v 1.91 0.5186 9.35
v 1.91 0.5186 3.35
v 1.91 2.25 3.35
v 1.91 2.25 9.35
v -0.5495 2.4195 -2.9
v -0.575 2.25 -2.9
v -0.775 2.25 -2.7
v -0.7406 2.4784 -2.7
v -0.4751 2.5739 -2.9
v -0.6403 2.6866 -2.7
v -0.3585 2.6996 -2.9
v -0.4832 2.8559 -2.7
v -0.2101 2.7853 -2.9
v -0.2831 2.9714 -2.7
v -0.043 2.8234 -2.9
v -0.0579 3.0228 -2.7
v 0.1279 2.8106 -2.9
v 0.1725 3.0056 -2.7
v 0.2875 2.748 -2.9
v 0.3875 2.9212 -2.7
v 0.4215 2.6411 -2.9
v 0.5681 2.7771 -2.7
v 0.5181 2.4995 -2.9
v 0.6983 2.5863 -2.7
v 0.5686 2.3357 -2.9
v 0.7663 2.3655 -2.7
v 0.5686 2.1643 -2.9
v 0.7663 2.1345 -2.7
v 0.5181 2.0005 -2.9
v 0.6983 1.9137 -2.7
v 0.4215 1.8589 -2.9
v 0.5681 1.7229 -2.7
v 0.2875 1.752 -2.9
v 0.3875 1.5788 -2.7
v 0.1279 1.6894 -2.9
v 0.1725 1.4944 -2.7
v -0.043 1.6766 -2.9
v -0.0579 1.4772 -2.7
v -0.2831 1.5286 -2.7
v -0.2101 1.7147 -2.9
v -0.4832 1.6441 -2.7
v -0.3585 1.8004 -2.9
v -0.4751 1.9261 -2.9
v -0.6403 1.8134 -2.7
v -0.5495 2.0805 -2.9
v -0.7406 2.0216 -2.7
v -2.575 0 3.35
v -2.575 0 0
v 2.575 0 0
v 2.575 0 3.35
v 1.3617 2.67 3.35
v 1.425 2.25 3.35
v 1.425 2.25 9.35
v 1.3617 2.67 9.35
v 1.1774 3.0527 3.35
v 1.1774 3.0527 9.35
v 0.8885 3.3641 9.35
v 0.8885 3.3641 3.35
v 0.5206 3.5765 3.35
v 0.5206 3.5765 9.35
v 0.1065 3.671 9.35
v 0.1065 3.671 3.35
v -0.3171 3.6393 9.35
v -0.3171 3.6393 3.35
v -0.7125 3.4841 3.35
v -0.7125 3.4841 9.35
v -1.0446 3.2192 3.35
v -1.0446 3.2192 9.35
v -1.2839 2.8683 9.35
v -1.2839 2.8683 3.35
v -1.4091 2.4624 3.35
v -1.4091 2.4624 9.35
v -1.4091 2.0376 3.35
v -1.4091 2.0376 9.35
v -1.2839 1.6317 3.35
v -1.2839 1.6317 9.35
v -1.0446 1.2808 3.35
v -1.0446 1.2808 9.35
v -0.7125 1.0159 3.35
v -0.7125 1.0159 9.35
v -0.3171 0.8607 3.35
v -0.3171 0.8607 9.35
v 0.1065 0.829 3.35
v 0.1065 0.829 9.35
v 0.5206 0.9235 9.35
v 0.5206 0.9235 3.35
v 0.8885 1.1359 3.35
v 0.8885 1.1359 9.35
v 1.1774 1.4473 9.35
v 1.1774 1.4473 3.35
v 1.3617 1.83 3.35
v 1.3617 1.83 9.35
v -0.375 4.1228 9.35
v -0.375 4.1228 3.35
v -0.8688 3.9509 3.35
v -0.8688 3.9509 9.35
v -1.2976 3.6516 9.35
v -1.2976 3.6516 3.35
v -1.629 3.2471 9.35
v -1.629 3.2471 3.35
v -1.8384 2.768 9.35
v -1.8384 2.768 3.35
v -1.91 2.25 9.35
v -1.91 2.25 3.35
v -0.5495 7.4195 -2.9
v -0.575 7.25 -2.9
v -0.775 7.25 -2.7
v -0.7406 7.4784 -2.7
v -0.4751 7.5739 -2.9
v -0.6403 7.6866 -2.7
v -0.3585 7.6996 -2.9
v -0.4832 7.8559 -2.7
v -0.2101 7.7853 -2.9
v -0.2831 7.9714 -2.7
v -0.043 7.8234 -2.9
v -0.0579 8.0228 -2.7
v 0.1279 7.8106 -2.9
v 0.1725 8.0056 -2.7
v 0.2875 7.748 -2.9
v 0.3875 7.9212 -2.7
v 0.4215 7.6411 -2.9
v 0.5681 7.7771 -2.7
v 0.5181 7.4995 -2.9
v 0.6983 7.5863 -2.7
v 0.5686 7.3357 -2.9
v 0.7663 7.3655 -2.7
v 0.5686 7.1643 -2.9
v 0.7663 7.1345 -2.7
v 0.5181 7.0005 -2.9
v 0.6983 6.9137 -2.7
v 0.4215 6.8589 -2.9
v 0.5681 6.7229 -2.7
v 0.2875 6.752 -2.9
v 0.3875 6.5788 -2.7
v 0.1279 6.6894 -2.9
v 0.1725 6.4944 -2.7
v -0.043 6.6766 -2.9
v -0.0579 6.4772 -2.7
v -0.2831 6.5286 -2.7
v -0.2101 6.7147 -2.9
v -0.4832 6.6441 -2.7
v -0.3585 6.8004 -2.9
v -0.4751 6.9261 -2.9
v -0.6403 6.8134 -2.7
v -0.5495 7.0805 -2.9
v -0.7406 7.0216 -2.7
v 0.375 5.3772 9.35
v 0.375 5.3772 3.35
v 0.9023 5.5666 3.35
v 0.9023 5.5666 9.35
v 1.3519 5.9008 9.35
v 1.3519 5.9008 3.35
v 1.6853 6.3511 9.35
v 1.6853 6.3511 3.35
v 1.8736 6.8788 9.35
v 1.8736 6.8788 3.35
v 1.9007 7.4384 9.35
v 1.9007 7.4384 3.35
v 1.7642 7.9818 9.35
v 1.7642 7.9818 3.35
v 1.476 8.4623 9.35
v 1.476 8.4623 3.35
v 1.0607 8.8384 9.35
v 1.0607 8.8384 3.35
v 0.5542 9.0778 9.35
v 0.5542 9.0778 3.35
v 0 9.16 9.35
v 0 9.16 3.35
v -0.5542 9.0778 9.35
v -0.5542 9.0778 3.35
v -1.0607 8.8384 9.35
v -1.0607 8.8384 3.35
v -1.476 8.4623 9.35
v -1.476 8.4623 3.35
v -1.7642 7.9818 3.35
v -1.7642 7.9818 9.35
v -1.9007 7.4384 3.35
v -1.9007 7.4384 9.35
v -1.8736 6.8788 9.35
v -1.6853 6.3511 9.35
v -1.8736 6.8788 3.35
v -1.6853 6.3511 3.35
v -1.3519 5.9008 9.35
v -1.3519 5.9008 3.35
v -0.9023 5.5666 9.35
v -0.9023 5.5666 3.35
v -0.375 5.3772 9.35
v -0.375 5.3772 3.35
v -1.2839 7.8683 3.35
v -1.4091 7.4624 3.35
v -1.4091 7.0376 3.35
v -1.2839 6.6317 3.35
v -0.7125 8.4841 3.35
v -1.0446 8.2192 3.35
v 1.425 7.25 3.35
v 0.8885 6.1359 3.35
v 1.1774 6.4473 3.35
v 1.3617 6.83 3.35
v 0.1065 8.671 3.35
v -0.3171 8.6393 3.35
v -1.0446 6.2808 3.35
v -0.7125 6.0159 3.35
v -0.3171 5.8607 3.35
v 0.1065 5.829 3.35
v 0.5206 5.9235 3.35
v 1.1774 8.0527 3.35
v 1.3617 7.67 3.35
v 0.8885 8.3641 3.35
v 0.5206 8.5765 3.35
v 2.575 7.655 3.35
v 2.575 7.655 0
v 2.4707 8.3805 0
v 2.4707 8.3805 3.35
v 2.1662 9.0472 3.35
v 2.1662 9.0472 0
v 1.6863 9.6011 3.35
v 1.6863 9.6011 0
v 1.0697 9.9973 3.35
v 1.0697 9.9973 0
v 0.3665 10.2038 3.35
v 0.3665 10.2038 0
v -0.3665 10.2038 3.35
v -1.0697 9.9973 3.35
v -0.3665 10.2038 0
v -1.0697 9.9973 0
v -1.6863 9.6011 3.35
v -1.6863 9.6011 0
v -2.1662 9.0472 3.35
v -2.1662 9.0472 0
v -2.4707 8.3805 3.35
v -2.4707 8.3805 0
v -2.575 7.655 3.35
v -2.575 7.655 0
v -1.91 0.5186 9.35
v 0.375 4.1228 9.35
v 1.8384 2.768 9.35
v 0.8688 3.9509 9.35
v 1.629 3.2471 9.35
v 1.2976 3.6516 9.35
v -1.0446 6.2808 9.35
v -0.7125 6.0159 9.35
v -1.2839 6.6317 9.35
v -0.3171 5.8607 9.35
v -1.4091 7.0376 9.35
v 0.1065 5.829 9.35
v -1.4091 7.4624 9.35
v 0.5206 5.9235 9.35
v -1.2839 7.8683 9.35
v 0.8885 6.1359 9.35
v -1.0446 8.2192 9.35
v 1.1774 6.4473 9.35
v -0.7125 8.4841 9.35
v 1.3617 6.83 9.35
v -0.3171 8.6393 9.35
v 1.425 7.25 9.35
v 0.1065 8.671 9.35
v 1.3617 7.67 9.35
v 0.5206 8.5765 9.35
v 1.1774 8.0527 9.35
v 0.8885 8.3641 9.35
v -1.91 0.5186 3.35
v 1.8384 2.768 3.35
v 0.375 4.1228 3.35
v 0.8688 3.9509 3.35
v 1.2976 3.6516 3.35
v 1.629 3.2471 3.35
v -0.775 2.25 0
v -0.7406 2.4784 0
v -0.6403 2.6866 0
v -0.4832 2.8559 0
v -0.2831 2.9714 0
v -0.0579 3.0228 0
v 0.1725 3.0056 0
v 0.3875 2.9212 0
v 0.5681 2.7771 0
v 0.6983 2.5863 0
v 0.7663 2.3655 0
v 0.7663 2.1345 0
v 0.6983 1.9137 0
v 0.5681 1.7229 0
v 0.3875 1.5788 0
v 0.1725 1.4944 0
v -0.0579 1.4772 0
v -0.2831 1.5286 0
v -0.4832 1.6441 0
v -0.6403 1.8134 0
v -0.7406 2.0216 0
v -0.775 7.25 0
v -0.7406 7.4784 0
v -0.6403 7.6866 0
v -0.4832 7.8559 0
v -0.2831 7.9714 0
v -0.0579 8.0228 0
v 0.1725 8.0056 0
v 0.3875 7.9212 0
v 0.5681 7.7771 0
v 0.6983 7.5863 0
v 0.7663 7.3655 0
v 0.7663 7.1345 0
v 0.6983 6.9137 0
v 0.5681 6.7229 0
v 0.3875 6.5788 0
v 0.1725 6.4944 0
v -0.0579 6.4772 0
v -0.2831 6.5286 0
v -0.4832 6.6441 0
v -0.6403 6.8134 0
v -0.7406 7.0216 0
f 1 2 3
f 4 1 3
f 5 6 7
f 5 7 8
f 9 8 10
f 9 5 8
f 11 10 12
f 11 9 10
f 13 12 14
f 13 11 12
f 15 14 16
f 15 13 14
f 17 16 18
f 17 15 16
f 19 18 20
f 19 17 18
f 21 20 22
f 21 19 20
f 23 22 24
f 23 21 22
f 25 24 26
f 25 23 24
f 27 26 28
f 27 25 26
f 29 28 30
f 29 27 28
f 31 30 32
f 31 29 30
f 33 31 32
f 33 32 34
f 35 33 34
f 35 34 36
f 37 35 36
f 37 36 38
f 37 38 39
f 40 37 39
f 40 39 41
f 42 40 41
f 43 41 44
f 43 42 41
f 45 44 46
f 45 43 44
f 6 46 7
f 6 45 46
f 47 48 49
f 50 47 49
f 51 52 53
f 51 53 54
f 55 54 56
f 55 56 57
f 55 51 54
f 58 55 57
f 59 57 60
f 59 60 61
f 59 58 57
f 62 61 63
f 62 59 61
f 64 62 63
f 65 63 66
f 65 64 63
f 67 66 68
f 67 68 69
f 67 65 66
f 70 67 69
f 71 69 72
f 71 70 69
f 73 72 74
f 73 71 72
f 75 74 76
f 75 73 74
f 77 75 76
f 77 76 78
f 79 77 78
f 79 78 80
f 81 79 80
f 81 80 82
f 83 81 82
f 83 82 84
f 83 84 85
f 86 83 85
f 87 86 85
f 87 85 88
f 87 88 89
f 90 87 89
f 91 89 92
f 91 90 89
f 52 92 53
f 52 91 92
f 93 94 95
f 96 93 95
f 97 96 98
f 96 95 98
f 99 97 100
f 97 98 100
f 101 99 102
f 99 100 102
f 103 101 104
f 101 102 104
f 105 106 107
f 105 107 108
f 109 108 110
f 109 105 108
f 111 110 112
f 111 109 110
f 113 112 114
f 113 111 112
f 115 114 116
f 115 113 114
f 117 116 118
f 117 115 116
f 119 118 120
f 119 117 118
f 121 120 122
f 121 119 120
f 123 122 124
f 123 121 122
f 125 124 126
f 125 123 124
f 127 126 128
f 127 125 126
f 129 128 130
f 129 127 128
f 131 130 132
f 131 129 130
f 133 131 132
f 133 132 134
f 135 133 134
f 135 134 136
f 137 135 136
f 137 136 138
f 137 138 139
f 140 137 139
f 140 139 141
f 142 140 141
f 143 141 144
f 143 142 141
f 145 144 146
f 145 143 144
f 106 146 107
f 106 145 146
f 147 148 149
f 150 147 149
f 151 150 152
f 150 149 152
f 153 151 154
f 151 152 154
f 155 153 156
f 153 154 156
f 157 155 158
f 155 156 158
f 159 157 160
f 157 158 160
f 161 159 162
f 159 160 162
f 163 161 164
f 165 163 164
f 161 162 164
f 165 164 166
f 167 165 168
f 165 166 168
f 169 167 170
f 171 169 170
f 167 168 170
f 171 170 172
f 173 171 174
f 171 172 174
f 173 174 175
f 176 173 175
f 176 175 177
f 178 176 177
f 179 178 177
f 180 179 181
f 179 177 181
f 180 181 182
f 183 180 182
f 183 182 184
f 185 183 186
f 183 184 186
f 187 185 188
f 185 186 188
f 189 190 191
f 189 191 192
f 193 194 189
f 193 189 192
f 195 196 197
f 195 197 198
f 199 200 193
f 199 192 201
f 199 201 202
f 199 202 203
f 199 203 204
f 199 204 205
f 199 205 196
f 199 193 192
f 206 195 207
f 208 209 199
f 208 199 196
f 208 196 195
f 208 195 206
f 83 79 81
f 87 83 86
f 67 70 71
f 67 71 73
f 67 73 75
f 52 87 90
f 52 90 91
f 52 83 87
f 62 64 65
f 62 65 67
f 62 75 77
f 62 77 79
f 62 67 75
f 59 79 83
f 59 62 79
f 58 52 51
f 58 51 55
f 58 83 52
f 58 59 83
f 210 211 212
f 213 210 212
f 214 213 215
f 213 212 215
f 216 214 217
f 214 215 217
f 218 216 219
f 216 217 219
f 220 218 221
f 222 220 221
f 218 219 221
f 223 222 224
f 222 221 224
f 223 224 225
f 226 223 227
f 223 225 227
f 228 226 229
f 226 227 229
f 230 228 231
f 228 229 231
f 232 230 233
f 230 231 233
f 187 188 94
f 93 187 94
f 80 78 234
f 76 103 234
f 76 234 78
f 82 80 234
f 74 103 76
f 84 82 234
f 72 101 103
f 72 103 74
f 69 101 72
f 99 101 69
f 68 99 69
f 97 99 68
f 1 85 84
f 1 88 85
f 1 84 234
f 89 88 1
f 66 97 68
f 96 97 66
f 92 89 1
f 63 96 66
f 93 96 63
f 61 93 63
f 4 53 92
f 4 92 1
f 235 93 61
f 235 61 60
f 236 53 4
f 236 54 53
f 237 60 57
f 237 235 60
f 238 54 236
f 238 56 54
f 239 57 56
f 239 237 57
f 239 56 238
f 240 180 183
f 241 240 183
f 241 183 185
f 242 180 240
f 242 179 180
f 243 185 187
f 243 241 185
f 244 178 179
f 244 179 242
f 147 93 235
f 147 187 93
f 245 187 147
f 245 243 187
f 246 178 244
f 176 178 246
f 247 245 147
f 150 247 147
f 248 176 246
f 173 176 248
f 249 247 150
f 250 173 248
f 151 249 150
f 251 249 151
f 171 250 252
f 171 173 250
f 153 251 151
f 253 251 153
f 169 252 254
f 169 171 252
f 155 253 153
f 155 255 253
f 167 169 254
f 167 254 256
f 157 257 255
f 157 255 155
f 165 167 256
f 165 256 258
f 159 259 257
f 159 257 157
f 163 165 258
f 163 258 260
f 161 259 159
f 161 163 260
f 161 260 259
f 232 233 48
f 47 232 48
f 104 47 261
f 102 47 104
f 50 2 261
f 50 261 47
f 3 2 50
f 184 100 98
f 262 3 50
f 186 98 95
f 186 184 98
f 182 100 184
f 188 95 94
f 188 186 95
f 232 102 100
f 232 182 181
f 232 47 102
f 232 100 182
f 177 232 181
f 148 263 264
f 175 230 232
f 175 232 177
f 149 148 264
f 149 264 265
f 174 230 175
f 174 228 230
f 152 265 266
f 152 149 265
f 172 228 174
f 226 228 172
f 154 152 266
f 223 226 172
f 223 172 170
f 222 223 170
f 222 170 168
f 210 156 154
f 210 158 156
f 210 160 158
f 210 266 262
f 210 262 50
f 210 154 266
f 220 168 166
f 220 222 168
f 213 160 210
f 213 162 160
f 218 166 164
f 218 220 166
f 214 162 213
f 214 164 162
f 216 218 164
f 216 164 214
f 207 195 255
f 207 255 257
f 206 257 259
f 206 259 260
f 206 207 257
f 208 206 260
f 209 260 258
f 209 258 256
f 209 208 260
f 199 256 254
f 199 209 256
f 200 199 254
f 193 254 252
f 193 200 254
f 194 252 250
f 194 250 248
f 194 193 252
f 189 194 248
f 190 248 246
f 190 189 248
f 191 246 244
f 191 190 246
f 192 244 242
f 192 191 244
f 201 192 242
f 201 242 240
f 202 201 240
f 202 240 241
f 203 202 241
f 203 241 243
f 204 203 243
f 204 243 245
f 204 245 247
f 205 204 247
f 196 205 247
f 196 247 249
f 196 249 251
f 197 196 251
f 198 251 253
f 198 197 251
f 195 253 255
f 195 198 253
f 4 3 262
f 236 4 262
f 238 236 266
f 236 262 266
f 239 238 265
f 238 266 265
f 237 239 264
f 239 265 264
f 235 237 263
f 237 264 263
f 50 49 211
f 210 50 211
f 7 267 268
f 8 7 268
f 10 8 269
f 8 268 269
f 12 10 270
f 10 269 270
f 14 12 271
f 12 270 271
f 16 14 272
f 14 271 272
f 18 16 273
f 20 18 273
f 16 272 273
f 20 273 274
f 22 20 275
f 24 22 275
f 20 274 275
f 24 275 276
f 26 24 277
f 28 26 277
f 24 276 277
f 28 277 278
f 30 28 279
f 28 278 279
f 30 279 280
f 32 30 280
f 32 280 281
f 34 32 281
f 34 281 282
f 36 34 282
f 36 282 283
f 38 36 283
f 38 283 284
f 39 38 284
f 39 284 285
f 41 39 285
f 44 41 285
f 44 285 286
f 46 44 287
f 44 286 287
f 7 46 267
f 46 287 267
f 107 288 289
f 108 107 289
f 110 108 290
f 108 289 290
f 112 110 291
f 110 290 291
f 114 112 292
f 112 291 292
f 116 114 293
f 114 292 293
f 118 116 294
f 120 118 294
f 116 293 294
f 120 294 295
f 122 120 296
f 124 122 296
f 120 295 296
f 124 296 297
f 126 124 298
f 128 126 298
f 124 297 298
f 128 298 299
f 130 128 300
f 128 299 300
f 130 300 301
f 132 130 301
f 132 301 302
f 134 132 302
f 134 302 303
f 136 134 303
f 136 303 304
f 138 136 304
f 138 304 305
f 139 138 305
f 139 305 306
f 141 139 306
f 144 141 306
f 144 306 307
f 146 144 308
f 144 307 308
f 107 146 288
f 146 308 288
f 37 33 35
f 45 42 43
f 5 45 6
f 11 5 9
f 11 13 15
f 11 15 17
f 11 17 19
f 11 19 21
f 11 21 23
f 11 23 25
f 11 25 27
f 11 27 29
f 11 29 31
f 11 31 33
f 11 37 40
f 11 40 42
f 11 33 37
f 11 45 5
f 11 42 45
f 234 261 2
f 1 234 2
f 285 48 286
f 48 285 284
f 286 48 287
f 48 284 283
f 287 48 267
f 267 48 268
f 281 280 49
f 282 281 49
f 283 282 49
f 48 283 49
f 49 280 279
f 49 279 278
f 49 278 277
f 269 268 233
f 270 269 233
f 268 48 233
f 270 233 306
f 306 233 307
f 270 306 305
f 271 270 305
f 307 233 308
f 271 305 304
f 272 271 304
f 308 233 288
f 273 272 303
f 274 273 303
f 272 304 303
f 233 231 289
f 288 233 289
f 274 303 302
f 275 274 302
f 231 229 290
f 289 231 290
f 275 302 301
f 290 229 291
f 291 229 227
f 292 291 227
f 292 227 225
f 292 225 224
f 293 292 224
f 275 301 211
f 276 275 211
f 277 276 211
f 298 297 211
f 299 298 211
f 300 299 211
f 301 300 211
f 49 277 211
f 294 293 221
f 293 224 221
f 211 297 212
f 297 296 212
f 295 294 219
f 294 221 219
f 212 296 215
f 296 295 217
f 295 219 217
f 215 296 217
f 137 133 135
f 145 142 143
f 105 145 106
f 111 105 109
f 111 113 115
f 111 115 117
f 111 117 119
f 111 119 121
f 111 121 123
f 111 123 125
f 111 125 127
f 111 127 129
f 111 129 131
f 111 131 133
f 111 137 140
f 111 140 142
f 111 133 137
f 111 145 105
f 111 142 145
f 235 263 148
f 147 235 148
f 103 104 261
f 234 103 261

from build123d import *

# Parameters (mm, degrees)
SALIENTE_EXTRUIR1_DEPTH = 3.35
CROQUIS2_R              = 0.775
SALIENTE_EXTRUIR2_DEPTH = 2.9
CHAFL_N1_SIZE           = 0.2
CROQUIS3_R              = 1.425
SALIENTE_EXTRUIR3_DEPTH = 6


with BuildPart() as part:
    # Croquis1 → Saliente-Extruir1 (new body)
    with BuildSketch(Plane.XY):
        with BuildLine():
            Line((-2.575, 7.655), (-2.575, 0))
            Line((-2.575, 0), (2.575, 0))
            Line((2.575, 0), (2.575, 7.655))
            ThreePointArc((2.575, 7.655), (0, 10.23), (-2.575, 7.655))
        make_face()
    extrude(amount=SALIENTE_EXTRUIR1_DEPTH)

    # Croquis2 → Saliente-Extruir2 (add)
    with BuildSketch(Plane(origin=(0, 0, 0), x_dir=(-1, 0, 0), z_dir=(0, 0, -1))):
        with Locations((0, 7.25)):
            Circle(CROQUIS2_R)
        with Locations((0, 2.25)):
            Circle(CROQUIS2_R)
    extrude(amount=SALIENTE_EXTRUIR2_DEPTH)

    # Chaflán1
    chafl_n1_edges = [part.edges().sort_by_distance(p)[0] for p in [
        (0.775, 7.25, -2.9),
        (0.775, 2.25, -2.9),
    ]]
    chamfer(chafl_n1_edges, length=CHAFL_N1_SIZE)

    # Croquis3 → Saliente-Extruir3 (add)
    with BuildSketch(Plane.XY.offset(3.35)):
        with BuildLine():
            Line((-1.91, 2.25), (-1.91, 0.51859855))
            Line((-1.91, 0.51859855), (1.91, 0.51859855))
            Line((1.91, 0.51859855), (1.91, 2.25))
            ThreePointArc((1.91, 2.25), (1.47721867, 3.460753897), (0.375, 4.122825406))
            Line((0.375, 4.122825406), (0.375, 5.377174594))
            ThreePointArc((0.375, 5.377174594), (0, 9.16), (-0.375, 5.377174594))
            Line((-0.375, 5.377174594), (-0.375, 4.122825406))
            ThreePointArc((-0.375, 4.122825406), (-1.47721867, 3.460753897), (-1.91, 2.25))
        make_face()
        with Locations((0, 2.25)):
            Circle(CROQUIS3_R, mode=Mode.SUBTRACT)
        with Locations((0, 7.25)):
            Circle(CROQUIS3_R, mode=Mode.SUBTRACT)
    extrude(amount=SALIENTE_EXTRUIR3_DEPTH)


solid = part.part
